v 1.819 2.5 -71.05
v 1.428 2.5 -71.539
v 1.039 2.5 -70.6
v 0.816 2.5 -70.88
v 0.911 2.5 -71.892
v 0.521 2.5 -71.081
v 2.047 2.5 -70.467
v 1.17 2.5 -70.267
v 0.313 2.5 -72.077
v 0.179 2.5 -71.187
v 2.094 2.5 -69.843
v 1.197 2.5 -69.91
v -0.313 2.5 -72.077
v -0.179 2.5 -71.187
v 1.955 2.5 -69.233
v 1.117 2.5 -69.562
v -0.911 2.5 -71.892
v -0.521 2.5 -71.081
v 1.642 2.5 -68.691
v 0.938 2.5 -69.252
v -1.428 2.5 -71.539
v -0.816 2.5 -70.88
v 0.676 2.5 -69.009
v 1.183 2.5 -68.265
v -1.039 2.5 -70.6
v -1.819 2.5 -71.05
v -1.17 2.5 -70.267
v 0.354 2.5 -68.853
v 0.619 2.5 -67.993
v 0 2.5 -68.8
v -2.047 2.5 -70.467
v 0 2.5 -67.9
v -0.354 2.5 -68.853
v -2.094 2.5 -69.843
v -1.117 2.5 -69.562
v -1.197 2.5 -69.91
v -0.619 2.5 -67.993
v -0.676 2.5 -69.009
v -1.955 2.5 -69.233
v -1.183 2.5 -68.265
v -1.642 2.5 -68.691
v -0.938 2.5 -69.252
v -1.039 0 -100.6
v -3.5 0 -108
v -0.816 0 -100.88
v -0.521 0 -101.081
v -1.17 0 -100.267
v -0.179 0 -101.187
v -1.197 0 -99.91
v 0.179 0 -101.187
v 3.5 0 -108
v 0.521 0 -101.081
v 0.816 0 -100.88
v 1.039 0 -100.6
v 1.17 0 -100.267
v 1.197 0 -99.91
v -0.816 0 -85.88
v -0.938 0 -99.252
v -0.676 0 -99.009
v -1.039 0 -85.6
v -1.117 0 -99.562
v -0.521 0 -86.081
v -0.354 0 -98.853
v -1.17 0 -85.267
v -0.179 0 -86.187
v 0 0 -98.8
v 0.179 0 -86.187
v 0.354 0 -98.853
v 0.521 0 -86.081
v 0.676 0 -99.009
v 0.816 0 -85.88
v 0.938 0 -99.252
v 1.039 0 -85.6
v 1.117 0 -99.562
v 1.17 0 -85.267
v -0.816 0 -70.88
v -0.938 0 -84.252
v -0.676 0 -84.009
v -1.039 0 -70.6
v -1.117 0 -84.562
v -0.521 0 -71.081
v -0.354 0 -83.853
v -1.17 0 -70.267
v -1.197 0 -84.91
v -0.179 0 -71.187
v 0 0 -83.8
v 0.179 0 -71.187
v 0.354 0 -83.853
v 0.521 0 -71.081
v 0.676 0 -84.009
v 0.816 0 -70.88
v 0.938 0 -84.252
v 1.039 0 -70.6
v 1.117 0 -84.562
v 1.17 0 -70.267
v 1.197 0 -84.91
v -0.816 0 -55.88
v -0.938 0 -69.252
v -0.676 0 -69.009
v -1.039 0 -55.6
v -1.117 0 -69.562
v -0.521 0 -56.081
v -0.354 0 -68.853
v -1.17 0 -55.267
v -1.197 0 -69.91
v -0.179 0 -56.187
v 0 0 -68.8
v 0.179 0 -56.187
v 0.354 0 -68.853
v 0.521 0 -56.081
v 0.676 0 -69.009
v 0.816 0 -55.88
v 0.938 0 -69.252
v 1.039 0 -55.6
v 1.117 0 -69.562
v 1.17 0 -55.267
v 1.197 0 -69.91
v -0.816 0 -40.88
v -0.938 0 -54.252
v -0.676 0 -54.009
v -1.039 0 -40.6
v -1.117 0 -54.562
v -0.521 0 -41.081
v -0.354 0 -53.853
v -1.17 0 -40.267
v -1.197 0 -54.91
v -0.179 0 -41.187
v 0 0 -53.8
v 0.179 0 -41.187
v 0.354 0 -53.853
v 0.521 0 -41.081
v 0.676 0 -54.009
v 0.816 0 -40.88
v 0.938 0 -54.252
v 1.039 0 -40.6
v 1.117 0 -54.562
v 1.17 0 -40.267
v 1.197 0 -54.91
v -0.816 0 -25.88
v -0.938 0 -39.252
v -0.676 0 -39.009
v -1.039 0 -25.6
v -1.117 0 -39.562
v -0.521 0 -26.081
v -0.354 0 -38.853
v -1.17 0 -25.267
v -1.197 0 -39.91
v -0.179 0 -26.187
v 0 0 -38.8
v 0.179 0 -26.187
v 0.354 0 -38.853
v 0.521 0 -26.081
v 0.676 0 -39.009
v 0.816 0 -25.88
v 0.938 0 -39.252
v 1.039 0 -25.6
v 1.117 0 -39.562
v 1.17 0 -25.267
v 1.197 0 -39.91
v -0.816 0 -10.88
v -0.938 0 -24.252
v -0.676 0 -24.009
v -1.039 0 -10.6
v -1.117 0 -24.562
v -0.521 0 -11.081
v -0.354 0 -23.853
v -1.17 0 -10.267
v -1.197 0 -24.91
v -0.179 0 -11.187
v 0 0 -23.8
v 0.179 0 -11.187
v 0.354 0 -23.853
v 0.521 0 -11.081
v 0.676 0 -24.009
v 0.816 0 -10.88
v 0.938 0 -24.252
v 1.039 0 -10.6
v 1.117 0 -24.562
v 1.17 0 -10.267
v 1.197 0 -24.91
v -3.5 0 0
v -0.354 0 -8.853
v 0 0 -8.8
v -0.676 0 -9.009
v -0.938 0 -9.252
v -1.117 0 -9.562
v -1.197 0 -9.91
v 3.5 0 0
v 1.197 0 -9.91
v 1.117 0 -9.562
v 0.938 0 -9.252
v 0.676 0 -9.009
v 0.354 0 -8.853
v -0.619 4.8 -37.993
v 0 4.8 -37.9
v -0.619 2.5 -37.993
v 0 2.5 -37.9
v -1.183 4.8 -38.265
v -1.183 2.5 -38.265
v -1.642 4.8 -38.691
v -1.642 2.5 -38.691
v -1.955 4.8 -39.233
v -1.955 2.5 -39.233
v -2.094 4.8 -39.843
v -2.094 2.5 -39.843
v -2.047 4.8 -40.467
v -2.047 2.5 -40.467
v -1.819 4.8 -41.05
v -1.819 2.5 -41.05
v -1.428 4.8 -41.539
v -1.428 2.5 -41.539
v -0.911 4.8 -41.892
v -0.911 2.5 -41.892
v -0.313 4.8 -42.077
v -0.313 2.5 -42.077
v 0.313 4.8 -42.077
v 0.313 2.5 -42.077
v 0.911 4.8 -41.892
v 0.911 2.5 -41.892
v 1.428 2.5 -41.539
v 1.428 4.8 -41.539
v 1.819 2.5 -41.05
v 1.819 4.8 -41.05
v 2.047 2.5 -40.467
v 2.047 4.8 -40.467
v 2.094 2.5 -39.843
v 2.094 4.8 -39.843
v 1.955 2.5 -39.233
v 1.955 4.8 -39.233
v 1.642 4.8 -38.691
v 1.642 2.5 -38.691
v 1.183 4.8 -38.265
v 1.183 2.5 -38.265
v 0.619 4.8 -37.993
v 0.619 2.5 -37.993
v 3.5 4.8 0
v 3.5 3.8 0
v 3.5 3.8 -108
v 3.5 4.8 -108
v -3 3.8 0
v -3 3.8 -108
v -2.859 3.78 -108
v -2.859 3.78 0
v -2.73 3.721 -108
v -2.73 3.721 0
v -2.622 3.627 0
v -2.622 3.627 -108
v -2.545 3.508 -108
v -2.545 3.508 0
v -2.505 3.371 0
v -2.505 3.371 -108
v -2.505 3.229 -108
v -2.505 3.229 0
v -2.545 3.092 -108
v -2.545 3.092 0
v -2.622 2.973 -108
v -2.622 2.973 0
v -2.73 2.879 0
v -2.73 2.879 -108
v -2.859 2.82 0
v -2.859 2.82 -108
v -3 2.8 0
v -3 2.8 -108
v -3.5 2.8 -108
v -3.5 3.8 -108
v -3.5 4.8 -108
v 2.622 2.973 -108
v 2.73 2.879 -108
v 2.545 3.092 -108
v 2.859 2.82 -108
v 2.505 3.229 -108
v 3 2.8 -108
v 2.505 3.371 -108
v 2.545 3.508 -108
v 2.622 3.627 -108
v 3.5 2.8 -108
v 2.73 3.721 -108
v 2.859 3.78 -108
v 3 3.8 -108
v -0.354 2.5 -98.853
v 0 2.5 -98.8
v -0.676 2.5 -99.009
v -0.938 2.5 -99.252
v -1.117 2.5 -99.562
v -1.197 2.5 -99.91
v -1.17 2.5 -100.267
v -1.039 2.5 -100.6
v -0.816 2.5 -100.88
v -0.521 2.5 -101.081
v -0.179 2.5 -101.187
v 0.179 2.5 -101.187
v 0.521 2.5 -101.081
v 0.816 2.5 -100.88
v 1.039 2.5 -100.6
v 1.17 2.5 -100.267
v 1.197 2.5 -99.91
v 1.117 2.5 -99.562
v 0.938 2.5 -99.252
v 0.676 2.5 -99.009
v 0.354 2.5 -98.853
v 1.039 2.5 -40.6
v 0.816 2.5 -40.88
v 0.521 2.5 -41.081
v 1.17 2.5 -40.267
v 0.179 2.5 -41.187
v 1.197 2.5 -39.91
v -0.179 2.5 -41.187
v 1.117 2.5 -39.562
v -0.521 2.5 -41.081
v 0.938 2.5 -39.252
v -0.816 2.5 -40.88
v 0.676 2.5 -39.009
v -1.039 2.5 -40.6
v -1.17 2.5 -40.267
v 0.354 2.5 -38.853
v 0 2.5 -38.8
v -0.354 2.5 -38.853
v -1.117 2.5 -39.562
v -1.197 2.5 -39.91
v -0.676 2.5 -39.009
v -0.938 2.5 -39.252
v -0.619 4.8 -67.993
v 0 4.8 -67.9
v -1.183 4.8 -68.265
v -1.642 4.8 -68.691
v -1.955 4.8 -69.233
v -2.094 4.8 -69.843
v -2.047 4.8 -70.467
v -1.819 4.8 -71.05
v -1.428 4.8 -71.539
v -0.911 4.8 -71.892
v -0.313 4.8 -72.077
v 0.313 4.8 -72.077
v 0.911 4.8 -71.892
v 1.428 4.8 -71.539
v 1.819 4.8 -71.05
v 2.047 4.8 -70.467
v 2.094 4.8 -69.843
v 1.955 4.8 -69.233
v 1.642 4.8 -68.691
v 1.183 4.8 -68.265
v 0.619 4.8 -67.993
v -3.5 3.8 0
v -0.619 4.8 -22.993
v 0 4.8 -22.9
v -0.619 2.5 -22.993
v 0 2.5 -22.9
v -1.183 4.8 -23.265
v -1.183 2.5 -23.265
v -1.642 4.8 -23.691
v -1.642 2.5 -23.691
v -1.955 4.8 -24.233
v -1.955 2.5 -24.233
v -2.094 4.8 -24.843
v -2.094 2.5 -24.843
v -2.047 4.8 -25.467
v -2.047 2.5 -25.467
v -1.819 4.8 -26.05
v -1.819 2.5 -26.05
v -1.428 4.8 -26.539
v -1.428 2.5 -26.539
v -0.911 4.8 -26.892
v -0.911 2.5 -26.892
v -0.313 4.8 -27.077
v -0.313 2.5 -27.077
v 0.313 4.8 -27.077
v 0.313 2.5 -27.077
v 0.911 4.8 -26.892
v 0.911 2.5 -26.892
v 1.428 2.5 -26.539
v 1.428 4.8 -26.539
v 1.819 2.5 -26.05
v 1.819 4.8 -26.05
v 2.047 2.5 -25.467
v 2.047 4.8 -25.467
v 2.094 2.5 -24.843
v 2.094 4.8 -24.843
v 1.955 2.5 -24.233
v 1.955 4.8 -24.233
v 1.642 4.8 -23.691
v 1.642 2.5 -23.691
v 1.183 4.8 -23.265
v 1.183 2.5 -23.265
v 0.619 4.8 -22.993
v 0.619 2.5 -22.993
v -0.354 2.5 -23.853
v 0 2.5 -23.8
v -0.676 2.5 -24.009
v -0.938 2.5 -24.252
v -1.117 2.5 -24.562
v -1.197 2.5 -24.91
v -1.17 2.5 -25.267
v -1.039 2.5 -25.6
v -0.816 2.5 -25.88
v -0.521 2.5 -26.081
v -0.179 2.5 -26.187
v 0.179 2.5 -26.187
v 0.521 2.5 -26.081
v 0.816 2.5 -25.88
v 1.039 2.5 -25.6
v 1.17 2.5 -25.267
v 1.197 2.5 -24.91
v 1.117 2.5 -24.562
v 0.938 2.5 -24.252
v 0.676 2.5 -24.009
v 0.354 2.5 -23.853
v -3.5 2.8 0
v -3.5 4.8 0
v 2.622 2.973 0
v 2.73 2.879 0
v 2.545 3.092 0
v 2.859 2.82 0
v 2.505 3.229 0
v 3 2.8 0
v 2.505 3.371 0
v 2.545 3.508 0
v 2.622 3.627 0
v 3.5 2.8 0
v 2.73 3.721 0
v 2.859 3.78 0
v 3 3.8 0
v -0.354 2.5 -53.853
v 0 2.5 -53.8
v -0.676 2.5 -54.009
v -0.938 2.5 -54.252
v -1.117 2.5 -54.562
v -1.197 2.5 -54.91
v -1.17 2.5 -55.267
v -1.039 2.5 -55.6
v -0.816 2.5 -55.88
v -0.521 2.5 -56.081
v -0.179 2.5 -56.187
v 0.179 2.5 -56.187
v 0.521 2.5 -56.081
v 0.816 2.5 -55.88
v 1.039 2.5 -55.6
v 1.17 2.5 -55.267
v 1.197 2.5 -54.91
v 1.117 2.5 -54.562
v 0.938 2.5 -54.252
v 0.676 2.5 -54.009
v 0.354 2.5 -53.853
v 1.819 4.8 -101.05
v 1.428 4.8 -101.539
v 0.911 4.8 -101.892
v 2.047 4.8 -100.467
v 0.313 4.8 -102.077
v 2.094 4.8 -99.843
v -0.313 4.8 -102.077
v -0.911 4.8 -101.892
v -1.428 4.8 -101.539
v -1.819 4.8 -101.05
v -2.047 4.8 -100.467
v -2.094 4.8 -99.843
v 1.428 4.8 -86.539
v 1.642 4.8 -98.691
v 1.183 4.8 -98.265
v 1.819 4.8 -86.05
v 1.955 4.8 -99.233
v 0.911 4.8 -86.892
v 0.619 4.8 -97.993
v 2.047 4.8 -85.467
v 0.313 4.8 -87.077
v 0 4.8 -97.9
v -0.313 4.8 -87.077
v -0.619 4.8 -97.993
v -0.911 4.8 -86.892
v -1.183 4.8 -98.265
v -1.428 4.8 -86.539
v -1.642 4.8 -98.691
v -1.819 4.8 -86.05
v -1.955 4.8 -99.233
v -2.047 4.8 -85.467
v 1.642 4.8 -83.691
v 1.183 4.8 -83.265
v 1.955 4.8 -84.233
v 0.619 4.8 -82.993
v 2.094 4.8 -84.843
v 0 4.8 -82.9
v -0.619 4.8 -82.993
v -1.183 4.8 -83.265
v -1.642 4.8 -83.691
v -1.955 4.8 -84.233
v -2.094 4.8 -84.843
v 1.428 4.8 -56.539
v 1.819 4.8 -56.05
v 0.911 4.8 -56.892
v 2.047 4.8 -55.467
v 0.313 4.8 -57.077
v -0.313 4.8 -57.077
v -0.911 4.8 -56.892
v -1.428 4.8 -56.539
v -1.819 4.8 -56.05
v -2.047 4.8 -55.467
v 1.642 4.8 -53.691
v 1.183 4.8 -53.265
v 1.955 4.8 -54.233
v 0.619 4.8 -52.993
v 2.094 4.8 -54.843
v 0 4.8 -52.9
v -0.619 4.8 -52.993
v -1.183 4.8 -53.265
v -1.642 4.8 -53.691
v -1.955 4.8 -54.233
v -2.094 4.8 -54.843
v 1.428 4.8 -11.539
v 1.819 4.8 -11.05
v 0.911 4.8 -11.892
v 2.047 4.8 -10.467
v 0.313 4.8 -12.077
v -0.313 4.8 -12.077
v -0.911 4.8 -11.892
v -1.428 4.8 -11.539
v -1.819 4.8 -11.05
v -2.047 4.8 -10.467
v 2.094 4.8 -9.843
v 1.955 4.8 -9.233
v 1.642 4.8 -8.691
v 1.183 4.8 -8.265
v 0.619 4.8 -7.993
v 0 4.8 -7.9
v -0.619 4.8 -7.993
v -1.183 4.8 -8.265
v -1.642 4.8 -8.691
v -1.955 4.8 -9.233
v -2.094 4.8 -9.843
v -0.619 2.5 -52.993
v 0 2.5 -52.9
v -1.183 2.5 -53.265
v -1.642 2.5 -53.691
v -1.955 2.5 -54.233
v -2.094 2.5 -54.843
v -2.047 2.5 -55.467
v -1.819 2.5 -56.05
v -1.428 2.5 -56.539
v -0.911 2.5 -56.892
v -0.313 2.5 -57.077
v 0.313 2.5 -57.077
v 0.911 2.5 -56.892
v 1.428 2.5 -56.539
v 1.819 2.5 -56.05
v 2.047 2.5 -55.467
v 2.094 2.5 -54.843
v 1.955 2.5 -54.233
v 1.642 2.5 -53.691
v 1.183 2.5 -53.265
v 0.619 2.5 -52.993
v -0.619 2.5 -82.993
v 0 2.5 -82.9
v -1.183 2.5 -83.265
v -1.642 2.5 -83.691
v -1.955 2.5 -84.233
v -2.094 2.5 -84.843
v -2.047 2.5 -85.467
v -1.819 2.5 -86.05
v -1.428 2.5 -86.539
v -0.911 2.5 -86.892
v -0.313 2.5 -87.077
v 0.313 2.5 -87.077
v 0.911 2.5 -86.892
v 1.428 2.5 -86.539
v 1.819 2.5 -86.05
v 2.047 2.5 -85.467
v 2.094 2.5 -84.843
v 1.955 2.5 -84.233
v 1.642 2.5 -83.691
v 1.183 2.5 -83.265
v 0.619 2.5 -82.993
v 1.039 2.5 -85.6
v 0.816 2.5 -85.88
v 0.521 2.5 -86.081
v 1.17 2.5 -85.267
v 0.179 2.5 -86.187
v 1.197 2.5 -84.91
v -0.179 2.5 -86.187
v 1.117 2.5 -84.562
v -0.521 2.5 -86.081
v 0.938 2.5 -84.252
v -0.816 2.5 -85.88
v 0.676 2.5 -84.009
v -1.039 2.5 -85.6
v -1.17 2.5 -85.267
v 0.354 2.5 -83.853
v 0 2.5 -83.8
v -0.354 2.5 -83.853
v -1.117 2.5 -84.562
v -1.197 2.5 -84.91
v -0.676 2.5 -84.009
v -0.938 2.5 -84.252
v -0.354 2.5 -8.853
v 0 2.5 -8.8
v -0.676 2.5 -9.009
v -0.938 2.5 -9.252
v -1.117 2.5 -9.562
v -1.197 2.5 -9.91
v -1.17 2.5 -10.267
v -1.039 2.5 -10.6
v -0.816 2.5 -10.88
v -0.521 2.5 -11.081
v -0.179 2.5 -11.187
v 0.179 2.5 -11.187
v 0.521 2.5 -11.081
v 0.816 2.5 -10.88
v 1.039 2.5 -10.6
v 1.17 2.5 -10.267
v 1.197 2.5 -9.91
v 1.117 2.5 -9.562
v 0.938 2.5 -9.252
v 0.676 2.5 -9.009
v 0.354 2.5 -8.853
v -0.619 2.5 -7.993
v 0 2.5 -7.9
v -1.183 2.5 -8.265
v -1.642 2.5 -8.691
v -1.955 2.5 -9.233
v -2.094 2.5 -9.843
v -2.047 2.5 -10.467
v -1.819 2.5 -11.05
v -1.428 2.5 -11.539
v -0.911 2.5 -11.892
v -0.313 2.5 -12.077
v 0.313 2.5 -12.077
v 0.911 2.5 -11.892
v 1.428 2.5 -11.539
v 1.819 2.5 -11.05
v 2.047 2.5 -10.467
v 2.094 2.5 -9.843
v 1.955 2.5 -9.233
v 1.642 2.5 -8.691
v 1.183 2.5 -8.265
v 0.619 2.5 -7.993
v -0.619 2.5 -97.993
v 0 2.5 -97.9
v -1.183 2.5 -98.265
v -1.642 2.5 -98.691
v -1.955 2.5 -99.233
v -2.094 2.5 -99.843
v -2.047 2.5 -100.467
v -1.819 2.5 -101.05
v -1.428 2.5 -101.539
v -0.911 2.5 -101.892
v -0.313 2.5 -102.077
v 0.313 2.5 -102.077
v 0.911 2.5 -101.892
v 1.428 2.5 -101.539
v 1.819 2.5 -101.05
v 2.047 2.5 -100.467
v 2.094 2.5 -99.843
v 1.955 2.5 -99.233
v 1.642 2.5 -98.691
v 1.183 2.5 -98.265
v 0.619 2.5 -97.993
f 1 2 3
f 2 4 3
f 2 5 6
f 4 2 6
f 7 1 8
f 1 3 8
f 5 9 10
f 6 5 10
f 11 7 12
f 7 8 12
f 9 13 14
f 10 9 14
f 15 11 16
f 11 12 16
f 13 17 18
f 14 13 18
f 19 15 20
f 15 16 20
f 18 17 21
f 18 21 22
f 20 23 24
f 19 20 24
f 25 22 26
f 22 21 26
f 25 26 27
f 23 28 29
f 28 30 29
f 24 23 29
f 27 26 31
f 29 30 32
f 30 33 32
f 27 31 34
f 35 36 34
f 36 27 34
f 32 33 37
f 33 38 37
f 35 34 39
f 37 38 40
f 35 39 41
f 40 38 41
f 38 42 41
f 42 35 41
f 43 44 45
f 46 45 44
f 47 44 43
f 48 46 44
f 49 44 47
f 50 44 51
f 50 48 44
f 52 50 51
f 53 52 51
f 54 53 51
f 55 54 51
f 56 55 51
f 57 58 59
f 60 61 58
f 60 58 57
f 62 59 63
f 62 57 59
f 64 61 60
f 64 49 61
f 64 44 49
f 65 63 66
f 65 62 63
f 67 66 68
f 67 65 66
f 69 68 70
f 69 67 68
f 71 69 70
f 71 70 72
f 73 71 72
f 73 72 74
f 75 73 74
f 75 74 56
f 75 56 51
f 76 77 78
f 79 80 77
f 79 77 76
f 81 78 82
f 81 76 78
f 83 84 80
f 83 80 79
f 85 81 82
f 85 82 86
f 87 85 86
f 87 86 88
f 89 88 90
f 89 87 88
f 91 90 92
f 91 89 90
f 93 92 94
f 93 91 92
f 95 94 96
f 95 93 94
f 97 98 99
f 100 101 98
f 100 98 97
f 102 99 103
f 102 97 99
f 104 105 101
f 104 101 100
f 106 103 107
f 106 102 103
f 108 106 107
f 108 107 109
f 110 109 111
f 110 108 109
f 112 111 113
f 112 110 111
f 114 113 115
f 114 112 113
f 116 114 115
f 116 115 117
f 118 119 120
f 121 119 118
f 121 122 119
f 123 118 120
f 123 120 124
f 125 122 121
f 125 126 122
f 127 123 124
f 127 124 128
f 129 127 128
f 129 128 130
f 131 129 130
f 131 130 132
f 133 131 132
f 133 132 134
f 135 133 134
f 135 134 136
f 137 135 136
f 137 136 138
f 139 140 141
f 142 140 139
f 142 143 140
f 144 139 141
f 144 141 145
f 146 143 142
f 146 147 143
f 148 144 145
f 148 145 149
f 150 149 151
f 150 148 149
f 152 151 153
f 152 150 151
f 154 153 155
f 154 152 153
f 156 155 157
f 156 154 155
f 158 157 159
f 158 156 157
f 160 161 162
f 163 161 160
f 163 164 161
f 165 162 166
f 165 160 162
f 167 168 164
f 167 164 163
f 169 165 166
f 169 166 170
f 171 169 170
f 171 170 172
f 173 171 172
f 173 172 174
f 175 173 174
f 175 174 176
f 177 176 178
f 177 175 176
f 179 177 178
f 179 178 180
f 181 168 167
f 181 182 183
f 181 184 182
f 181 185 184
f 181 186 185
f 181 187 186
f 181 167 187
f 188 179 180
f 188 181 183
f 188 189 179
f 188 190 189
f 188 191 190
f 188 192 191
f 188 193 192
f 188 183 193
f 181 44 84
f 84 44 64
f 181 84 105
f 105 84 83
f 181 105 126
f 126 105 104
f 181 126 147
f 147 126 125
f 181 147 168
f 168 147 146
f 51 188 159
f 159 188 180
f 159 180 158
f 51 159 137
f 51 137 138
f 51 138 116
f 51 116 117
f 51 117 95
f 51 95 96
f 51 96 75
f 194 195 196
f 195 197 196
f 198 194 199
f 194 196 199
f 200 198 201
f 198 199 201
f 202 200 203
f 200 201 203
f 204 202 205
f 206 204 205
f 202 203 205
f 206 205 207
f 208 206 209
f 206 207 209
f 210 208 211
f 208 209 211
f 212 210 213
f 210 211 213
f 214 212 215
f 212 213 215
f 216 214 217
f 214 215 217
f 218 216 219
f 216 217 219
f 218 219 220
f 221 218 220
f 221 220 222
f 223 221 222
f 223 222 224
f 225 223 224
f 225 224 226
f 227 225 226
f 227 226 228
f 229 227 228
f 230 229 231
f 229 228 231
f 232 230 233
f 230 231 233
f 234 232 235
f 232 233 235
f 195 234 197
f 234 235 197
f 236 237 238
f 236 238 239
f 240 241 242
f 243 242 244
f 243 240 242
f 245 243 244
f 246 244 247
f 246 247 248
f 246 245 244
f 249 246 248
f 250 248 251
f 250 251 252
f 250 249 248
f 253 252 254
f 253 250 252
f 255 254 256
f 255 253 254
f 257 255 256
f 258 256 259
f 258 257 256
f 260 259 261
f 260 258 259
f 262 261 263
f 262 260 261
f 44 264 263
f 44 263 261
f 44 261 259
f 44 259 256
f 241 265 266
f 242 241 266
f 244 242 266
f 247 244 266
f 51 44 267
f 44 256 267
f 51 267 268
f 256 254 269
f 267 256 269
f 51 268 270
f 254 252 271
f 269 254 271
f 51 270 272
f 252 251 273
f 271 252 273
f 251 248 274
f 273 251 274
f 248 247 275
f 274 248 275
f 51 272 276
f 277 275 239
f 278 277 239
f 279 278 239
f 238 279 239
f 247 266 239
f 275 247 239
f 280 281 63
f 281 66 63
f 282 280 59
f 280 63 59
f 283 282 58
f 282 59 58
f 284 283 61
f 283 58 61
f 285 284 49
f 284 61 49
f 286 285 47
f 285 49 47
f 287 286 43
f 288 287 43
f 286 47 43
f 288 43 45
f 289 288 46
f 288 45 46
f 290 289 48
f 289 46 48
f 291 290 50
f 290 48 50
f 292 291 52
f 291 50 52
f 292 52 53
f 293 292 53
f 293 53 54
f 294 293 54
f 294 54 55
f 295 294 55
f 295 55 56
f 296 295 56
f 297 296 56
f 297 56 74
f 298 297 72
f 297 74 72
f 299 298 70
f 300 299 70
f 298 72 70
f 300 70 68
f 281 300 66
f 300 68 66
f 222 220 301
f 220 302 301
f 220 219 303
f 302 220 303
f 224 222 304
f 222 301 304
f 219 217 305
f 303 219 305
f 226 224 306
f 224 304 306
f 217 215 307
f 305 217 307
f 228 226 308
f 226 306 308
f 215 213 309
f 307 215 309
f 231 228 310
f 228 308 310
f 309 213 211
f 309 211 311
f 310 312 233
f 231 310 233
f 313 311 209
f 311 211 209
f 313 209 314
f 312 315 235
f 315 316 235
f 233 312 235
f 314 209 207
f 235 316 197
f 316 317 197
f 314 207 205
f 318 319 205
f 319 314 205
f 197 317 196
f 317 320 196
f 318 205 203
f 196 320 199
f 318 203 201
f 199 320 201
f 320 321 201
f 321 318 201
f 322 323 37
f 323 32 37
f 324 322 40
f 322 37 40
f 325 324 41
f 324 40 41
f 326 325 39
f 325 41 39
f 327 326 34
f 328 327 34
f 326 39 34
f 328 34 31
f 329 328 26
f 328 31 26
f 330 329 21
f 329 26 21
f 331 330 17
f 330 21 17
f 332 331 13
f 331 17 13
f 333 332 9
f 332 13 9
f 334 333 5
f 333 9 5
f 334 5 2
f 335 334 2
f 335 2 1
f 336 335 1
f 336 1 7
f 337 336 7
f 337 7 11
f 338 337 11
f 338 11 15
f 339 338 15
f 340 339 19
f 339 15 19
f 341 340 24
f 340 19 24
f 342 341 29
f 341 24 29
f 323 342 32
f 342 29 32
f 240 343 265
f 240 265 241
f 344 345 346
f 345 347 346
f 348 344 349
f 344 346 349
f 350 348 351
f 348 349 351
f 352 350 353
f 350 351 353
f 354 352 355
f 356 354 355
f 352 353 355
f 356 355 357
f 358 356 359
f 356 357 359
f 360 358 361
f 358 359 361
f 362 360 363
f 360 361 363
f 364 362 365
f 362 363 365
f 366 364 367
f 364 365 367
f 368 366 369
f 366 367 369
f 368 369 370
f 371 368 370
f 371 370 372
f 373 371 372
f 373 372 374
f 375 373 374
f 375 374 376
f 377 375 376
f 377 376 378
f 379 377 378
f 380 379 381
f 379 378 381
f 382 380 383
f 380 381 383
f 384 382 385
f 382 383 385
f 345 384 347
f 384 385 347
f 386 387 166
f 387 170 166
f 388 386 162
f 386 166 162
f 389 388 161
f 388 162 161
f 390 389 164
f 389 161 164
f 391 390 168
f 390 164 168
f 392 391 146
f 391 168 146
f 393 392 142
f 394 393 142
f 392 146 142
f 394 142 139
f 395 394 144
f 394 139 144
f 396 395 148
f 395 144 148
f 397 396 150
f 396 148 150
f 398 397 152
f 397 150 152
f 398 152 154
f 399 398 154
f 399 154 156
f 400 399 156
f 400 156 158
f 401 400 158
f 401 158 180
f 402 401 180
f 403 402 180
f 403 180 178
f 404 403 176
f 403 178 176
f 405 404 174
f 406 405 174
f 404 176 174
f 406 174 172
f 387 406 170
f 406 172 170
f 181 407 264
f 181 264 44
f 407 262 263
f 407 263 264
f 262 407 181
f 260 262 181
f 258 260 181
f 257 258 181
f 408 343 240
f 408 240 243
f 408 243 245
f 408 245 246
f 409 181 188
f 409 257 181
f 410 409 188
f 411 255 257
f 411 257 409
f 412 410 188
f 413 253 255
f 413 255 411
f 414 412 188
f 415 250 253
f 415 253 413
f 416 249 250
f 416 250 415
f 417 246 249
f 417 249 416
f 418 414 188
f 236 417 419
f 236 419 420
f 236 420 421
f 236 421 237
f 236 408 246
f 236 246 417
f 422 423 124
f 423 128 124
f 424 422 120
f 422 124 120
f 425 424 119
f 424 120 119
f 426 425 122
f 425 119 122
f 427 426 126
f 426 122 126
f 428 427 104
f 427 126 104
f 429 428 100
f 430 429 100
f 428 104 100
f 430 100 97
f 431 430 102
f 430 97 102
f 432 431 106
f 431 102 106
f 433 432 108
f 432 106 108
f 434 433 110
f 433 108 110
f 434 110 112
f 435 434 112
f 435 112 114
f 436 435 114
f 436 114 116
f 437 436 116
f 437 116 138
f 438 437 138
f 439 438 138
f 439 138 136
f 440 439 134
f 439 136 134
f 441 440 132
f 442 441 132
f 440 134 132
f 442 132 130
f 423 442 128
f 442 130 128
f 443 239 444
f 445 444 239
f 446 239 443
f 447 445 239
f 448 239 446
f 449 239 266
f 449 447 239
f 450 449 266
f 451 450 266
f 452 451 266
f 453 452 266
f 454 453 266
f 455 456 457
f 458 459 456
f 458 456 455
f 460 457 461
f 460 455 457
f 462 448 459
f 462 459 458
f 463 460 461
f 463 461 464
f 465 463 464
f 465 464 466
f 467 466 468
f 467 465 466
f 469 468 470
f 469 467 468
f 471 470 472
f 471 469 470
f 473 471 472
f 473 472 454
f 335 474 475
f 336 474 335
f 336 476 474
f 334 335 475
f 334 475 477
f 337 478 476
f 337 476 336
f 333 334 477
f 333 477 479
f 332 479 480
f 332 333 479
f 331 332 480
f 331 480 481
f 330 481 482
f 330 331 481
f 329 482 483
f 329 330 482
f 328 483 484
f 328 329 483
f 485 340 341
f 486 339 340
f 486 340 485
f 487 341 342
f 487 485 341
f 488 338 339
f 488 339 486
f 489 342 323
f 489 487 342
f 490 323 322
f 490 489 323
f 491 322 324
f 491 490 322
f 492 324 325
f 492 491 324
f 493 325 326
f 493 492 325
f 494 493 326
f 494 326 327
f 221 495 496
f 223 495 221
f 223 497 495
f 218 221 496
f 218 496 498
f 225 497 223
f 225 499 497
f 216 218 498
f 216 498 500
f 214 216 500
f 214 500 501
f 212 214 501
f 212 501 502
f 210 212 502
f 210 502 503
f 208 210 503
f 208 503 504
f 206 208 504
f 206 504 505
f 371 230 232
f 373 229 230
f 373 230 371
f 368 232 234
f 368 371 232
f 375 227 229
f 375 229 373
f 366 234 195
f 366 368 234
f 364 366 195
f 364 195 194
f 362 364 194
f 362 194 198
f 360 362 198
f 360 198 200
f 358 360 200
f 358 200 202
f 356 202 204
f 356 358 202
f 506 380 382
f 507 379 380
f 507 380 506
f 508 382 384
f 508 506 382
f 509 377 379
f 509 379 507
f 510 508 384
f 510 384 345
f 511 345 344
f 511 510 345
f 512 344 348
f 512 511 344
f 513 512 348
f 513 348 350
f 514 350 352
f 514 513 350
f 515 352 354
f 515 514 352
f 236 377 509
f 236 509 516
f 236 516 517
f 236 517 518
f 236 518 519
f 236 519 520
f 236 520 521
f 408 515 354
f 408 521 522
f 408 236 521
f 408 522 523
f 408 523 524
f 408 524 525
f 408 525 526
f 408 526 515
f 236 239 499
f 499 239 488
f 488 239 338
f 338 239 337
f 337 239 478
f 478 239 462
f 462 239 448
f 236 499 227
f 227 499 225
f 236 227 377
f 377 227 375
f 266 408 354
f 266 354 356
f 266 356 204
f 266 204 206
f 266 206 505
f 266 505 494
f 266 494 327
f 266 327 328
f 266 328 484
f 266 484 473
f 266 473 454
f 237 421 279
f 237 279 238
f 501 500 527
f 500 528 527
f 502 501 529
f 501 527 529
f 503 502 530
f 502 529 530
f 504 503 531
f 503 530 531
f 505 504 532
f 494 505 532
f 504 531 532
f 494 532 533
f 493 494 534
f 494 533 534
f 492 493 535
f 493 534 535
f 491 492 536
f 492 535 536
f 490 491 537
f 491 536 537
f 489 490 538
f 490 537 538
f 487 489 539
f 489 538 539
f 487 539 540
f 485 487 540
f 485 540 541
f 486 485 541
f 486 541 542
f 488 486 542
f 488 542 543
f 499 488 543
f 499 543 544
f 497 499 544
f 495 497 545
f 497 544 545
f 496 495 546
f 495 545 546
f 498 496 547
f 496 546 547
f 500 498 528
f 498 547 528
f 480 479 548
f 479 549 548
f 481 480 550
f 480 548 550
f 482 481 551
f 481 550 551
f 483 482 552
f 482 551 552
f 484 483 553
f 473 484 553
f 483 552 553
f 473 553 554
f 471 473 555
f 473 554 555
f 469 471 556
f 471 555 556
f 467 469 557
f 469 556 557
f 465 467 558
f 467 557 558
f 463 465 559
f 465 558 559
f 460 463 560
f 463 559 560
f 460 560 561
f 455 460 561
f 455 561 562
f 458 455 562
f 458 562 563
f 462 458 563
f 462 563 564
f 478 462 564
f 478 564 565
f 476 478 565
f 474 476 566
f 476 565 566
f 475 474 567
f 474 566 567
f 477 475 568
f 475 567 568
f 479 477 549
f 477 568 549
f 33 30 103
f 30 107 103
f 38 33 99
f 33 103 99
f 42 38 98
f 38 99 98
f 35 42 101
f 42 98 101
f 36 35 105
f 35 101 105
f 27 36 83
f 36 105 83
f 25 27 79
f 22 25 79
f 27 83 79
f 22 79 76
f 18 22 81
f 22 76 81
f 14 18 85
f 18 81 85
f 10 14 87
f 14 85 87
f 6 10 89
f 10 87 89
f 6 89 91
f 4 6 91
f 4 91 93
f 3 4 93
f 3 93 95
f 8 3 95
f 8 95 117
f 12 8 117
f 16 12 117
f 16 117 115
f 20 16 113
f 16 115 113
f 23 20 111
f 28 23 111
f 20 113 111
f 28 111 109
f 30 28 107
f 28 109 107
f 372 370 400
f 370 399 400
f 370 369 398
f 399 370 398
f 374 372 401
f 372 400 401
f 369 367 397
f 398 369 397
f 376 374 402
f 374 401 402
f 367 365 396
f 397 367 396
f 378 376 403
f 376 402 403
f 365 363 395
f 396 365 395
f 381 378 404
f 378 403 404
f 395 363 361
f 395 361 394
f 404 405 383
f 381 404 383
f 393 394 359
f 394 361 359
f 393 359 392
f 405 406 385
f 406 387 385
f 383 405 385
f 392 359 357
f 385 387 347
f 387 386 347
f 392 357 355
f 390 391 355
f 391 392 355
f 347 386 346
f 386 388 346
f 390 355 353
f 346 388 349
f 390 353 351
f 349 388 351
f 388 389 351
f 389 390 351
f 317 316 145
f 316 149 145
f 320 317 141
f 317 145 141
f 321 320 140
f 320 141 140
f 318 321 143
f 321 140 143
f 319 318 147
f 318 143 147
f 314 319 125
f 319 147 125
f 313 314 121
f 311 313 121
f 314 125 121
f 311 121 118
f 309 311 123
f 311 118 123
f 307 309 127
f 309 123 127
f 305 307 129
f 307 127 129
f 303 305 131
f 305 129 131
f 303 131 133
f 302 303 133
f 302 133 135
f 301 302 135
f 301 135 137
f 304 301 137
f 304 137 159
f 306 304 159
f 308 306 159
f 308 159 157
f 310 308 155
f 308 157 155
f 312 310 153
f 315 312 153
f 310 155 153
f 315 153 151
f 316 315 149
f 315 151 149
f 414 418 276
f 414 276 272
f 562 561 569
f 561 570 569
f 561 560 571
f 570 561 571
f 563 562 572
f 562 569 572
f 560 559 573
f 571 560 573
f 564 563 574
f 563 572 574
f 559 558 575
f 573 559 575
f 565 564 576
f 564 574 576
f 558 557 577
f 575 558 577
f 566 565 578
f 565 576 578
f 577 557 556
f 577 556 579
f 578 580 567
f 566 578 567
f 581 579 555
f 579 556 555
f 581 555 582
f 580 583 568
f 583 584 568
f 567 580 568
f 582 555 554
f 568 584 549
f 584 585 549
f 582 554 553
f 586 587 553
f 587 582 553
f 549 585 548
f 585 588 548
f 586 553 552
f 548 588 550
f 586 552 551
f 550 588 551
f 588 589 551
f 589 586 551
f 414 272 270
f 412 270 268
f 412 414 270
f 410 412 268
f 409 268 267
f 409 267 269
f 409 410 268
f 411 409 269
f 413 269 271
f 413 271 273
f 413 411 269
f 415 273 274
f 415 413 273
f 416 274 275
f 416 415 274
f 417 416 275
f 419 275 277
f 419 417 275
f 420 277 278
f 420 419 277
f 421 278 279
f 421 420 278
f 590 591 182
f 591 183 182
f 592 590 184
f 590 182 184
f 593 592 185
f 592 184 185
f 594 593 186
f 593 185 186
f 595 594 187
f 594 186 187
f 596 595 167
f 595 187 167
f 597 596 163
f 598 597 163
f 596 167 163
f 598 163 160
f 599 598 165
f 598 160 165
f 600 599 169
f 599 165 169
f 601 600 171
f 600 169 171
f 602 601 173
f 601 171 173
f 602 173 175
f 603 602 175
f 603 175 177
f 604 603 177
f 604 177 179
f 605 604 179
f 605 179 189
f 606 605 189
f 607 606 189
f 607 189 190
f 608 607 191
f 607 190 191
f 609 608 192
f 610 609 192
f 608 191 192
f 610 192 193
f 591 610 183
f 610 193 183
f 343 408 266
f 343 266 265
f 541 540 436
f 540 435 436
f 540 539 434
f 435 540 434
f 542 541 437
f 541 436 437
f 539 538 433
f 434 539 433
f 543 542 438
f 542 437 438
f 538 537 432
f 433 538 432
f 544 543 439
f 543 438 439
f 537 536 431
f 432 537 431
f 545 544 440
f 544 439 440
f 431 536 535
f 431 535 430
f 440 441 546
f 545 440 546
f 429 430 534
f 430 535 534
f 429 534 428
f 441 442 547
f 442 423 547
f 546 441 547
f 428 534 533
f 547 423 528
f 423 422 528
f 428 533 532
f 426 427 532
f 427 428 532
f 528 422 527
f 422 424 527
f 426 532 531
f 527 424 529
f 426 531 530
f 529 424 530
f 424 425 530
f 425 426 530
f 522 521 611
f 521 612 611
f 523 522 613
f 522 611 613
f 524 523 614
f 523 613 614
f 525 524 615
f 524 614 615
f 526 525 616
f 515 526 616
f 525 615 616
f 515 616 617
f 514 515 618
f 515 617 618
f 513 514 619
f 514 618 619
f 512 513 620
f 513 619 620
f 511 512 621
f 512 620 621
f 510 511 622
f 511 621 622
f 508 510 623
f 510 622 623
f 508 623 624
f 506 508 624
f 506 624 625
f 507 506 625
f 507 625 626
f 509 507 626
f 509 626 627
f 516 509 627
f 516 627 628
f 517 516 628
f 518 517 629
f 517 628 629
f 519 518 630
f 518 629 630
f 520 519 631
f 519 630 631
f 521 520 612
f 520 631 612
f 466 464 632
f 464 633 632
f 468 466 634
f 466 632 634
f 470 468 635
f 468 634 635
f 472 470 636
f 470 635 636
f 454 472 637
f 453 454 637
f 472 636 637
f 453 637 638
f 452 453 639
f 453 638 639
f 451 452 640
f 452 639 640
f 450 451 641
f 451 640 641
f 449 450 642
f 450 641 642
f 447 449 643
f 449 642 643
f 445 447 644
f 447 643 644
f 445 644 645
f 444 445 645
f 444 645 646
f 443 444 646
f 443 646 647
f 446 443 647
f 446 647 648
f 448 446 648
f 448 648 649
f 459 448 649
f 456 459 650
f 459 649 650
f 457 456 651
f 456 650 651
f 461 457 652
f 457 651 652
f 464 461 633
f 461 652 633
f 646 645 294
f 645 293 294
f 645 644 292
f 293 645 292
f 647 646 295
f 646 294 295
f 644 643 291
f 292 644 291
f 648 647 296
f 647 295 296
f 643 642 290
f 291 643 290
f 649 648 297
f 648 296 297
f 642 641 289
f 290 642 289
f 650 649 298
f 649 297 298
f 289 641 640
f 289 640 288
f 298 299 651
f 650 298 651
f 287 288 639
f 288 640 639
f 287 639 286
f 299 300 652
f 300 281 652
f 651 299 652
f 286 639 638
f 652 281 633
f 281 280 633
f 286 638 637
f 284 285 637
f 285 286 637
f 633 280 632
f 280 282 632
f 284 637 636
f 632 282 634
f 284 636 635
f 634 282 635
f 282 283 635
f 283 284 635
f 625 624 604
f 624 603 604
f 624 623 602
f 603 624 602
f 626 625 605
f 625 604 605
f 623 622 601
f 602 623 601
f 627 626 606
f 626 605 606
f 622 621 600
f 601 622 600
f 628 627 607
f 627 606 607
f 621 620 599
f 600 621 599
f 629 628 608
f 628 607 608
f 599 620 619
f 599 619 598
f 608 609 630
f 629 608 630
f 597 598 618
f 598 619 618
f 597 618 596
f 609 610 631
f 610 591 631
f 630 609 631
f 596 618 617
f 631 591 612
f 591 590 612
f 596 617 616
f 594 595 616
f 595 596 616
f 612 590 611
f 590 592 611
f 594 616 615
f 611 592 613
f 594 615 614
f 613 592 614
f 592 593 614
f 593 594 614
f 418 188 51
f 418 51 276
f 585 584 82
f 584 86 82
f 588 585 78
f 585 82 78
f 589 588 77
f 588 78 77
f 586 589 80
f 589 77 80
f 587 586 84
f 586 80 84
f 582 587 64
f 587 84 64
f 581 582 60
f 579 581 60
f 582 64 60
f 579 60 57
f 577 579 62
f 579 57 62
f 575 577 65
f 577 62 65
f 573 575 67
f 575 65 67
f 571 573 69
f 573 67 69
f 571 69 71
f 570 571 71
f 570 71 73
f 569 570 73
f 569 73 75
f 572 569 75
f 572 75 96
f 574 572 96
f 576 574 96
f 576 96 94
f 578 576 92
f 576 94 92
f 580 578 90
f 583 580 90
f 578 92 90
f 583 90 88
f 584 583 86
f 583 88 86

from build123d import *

# Parameters (mm, degrees)
BOSS_EXTRUDE1_DEPTH = 108
LPATTERN1_COUNT     = 7
LPATTERN1_PITCH     = 15


with BuildPart() as part:
    # Sketch1 → Boss-Extrude1 (new body)
    with BuildSketch(Plane.XY):
        with BuildLine():
            Line((-3.5, 0), (3.5, 0))
            Line((3.5, 0), (3.5, 2.8))
            Line((3.5, 2.8), (3, 2.8))
            ThreePointArc((3, 2.8), (2.5, 3.3), (3, 3.8))
            Line((3, 3.8), (3.5, 3.8))
            Line((3.5, 3.8), (3.5, 4.8))
            Line((3.5, 4.8), (-3.5, 4.8))
            Line((-3.5, 4.8), (-3.5, 3.8))
            Line((-3.5, 3.8), (-3, 3.8))
            ThreePointArc((-3, 3.8), (-2.5, 3.3), (-3, 2.8))
            Line((-3, 2.8), (-3.5, 2.8))
            Line((-3.5, 2.8), (-3.5, 0))
        make_face()
    extrude(amount=-BOSS_EXTRUDE1_DEPTH)

    # Sketch2 → Cut-Revolve1 (revolve, cut)
    with BuildSketch(Plane(origin=(0, 0, 0), x_dir=(0, 0, -1), z_dir=(1, 0, 0))):
        Polygon((7.9, 4.8), (7.9, 2.5), (8.8, 2.5), (8.8, 0), (10, 0), (10, 4.8), align=None)
    cut_revolve1 = revolve(axis=Axis((0, 4.8, -10), (0, -1, 0)), mode=Mode.SUBTRACT)

    # LPattern1: Cut-Revolve1 ×7
    with Locations(*[(0, 0, -i * LPATTERN1_PITCH) for i in range(1, LPATTERN1_COUNT)]):
        add(cut_revolve1, mode=Mode.SUBTRACT)


solid = part.part
